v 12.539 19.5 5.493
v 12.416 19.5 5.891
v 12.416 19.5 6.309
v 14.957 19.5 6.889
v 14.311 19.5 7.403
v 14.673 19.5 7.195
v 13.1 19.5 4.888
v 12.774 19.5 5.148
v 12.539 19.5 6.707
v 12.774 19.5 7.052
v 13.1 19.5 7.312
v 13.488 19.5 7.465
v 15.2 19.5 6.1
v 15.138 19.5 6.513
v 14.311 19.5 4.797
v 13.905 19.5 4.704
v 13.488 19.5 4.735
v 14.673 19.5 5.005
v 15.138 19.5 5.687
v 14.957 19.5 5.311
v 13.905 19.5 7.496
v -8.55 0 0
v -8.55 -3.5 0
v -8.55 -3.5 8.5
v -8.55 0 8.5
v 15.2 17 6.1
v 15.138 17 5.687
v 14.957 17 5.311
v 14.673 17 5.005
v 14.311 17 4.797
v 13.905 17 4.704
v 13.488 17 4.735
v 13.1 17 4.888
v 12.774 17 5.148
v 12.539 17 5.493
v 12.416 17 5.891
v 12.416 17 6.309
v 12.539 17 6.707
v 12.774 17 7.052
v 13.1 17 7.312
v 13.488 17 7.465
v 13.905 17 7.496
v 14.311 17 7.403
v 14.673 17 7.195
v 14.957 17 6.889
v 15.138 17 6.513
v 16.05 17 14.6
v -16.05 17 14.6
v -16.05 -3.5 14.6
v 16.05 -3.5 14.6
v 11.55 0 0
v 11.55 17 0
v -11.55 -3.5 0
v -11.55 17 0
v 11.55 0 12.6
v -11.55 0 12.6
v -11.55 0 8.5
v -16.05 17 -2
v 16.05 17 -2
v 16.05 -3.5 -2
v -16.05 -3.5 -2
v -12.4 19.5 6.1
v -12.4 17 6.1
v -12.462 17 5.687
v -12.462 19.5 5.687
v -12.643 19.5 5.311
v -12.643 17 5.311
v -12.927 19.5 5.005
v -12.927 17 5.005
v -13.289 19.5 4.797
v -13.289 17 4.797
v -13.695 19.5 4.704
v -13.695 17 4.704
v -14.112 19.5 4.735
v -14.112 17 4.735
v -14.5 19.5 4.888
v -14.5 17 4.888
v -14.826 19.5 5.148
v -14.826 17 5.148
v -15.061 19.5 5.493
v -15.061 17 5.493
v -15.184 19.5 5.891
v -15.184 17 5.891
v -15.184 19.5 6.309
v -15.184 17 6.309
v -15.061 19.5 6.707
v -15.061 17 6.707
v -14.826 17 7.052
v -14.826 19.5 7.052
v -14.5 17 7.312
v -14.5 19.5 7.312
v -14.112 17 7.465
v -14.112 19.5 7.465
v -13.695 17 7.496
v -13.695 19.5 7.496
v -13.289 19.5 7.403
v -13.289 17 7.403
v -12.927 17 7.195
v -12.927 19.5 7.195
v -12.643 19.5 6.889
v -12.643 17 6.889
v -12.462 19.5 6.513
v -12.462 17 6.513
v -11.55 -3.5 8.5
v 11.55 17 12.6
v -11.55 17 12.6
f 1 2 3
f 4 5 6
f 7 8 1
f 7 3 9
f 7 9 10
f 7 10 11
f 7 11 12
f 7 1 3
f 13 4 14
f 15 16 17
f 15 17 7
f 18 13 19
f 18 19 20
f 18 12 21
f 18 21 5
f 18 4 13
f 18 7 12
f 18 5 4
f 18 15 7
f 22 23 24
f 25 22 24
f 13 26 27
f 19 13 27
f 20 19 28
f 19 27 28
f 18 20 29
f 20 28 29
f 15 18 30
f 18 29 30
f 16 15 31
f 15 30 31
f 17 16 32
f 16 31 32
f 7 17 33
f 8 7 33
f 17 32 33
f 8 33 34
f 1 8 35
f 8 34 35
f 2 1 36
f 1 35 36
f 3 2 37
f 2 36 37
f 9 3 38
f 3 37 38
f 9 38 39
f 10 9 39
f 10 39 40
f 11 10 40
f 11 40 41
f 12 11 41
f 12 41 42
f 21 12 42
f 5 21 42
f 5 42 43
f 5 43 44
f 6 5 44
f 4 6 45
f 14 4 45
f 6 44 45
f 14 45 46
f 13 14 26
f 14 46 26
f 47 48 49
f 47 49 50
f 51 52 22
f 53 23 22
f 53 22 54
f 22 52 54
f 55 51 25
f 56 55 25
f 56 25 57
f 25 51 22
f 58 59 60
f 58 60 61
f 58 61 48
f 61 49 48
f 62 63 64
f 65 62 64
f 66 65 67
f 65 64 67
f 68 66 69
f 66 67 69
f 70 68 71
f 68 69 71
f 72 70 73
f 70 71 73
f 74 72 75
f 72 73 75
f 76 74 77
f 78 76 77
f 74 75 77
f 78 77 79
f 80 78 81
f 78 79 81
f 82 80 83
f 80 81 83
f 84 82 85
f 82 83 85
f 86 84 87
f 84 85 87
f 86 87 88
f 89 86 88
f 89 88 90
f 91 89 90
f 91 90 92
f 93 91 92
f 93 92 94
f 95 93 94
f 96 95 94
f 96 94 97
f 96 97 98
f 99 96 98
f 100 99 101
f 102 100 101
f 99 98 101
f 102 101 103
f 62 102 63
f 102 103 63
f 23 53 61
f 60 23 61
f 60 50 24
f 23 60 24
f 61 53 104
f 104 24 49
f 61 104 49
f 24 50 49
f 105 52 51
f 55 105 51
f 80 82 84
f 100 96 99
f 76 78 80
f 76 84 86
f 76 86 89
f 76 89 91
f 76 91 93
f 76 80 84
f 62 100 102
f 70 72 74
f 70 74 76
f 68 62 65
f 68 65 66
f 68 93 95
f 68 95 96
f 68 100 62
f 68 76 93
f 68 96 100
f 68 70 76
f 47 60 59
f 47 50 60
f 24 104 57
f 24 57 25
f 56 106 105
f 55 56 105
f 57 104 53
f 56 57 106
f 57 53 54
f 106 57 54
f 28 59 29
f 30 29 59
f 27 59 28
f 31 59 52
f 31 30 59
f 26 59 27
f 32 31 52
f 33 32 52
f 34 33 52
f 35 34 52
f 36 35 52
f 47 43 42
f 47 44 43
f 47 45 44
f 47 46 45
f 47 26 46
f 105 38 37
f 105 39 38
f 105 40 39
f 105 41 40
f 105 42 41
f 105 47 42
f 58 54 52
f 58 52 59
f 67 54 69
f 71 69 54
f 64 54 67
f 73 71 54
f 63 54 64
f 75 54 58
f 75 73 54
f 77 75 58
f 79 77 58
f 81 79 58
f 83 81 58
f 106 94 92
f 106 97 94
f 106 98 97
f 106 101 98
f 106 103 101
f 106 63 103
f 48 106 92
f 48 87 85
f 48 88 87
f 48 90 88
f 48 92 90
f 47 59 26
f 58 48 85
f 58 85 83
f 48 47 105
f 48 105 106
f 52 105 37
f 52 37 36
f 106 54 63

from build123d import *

# Parameters (mm, degrees)
EXTRUDE_2_DEPTH          = 12.2
SKETCH_5_W               = 3
SKETCH_5_H               = 8.5
CUT_EXTRUDE_1_DEPTH      = 22.5
SKETCH_6_R               = 1.4
EXTRUDE_3_DEPTH          = 2.5
SKETCH_7_W               = 12.2
SKETCH_7_H               = 1
CUT_EXTRUDE_2_DEPTH      = 1
CUT_EXTRUDE_2_DEPTH_BACK = 32.1
EXTRUDE_4_DEPTH          = 0.2
EXTRUDE_5_DEPTH          = 0.2
SKETCH_10_W              = 32.1
SKETCH_10_H              = 20.5
EXTRUDE_6_DEPTH          = 2
SKETCH_11_W              = 32.1
SKETCH_11_H              = 20.5
EXTRUDE_7_DEPTH          = 2


with BuildPart() as part:
    # 草图4 → 凸台-拉伸2 (new body)
    with BuildSketch(Plane.XY):
        Polygon((-11.55, 0), (11.55, 0), (11.55, 17), (16.05, 17), (16.05, -4.5), (-16.05, -4.5), (-16.05, 17), (-11.55, 17), align=None)
    extrude(amount=EXTRUDE_2_DEPTH)

    # 草图5 → 切除-拉伸1 (cut, through all)
    with BuildSketch(Plane.XZ.offset(4.5)):
        with Locations((-10.05, 4.25)):
            Rectangle(SKETCH_5_W, SKETCH_5_H)
    extrude(amount=-CUT_EXTRUDE_1_DEPTH, mode=Mode.SUBTRACT)

    # 草图6 → 凸台-拉伸3 (add)
    with BuildSketch(Plane(origin=(0, 17, 0), x_dir=(1, 0, 0), z_dir=(0, 1, 0))):
        with Locations((13.8, -6.1)):
            Circle(SKETCH_6_R)
        with Locations((-13.8, -6.1)):
            Circle(SKETCH_6_R)
    extrude(amount=EXTRUDE_3_DEPTH)

    # 草图7 → 切除-拉伸2 (cut, two sides)
    with BuildSketch(Plane(origin=(16.05, 0, 0), x_dir=(0, 0, -1), z_dir=(1, 0, 0))) as cut_extrude_2_sk:
        with Locations((-6.1, -4)):
            Rectangle(SKETCH_7_W, SKETCH_7_H)
    extrude(amount=CUT_EXTRUDE_2_DEPTH, mode=Mode.SUBTRACT)
    extrude(cut_extrude_2_sk.sketch, amount=-CUT_EXTRUDE_2_DEPTH_BACK, mode=Mode.SUBTRACT)

    # 草图8 → 凸台-拉伸4 (add)
    with BuildSketch(Plane.XY.offset(12.2)):
        Polygon((-11.55, 17), (-16.05, 17), (-16.05, -3.5), (16.05, -3.5), (16.05, 17), (11.55, 17), (11.55, 0), (-11.55, 0), align=None)
    extrude(amount=EXTRUDE_4_DEPTH)

    # 草图9 → 凸台-拉伸5 (add)
    with BuildSketch(Plane.XY.offset(12.4)):
        Polygon((-11.55, 0), (-11.55, 17), (-16.05, 17), (-16.05, -3.5), (16.05, -3.5), (16.05, 17), (11.55, 17), (11.55, 0), align=None)
    extrude(amount=EXTRUDE_5_DEPTH)

    # 草图10 → 凸台-拉伸6 (add)
    with BuildSketch(Plane.XY.offset(12.6)):
        with Locations((0, 6.75)):
            Rectangle(SKETCH_10_W, SKETCH_10_H)
    extrude(amount=EXTRUDE_6_DEPTH)

    # 草图11 → 凸台-拉伸7 (add)
    with BuildSketch(Plane(origin=(0, 0, 0), x_dir=(-1, 0, 0), z_dir=(0, 0, -1))):
        with Locations((0, 6.75)):
            Rectangle(SKETCH_11_W, SKETCH_11_H)
    extrude(amount=EXTRUDE_7_DEPTH)


solid = part.part
